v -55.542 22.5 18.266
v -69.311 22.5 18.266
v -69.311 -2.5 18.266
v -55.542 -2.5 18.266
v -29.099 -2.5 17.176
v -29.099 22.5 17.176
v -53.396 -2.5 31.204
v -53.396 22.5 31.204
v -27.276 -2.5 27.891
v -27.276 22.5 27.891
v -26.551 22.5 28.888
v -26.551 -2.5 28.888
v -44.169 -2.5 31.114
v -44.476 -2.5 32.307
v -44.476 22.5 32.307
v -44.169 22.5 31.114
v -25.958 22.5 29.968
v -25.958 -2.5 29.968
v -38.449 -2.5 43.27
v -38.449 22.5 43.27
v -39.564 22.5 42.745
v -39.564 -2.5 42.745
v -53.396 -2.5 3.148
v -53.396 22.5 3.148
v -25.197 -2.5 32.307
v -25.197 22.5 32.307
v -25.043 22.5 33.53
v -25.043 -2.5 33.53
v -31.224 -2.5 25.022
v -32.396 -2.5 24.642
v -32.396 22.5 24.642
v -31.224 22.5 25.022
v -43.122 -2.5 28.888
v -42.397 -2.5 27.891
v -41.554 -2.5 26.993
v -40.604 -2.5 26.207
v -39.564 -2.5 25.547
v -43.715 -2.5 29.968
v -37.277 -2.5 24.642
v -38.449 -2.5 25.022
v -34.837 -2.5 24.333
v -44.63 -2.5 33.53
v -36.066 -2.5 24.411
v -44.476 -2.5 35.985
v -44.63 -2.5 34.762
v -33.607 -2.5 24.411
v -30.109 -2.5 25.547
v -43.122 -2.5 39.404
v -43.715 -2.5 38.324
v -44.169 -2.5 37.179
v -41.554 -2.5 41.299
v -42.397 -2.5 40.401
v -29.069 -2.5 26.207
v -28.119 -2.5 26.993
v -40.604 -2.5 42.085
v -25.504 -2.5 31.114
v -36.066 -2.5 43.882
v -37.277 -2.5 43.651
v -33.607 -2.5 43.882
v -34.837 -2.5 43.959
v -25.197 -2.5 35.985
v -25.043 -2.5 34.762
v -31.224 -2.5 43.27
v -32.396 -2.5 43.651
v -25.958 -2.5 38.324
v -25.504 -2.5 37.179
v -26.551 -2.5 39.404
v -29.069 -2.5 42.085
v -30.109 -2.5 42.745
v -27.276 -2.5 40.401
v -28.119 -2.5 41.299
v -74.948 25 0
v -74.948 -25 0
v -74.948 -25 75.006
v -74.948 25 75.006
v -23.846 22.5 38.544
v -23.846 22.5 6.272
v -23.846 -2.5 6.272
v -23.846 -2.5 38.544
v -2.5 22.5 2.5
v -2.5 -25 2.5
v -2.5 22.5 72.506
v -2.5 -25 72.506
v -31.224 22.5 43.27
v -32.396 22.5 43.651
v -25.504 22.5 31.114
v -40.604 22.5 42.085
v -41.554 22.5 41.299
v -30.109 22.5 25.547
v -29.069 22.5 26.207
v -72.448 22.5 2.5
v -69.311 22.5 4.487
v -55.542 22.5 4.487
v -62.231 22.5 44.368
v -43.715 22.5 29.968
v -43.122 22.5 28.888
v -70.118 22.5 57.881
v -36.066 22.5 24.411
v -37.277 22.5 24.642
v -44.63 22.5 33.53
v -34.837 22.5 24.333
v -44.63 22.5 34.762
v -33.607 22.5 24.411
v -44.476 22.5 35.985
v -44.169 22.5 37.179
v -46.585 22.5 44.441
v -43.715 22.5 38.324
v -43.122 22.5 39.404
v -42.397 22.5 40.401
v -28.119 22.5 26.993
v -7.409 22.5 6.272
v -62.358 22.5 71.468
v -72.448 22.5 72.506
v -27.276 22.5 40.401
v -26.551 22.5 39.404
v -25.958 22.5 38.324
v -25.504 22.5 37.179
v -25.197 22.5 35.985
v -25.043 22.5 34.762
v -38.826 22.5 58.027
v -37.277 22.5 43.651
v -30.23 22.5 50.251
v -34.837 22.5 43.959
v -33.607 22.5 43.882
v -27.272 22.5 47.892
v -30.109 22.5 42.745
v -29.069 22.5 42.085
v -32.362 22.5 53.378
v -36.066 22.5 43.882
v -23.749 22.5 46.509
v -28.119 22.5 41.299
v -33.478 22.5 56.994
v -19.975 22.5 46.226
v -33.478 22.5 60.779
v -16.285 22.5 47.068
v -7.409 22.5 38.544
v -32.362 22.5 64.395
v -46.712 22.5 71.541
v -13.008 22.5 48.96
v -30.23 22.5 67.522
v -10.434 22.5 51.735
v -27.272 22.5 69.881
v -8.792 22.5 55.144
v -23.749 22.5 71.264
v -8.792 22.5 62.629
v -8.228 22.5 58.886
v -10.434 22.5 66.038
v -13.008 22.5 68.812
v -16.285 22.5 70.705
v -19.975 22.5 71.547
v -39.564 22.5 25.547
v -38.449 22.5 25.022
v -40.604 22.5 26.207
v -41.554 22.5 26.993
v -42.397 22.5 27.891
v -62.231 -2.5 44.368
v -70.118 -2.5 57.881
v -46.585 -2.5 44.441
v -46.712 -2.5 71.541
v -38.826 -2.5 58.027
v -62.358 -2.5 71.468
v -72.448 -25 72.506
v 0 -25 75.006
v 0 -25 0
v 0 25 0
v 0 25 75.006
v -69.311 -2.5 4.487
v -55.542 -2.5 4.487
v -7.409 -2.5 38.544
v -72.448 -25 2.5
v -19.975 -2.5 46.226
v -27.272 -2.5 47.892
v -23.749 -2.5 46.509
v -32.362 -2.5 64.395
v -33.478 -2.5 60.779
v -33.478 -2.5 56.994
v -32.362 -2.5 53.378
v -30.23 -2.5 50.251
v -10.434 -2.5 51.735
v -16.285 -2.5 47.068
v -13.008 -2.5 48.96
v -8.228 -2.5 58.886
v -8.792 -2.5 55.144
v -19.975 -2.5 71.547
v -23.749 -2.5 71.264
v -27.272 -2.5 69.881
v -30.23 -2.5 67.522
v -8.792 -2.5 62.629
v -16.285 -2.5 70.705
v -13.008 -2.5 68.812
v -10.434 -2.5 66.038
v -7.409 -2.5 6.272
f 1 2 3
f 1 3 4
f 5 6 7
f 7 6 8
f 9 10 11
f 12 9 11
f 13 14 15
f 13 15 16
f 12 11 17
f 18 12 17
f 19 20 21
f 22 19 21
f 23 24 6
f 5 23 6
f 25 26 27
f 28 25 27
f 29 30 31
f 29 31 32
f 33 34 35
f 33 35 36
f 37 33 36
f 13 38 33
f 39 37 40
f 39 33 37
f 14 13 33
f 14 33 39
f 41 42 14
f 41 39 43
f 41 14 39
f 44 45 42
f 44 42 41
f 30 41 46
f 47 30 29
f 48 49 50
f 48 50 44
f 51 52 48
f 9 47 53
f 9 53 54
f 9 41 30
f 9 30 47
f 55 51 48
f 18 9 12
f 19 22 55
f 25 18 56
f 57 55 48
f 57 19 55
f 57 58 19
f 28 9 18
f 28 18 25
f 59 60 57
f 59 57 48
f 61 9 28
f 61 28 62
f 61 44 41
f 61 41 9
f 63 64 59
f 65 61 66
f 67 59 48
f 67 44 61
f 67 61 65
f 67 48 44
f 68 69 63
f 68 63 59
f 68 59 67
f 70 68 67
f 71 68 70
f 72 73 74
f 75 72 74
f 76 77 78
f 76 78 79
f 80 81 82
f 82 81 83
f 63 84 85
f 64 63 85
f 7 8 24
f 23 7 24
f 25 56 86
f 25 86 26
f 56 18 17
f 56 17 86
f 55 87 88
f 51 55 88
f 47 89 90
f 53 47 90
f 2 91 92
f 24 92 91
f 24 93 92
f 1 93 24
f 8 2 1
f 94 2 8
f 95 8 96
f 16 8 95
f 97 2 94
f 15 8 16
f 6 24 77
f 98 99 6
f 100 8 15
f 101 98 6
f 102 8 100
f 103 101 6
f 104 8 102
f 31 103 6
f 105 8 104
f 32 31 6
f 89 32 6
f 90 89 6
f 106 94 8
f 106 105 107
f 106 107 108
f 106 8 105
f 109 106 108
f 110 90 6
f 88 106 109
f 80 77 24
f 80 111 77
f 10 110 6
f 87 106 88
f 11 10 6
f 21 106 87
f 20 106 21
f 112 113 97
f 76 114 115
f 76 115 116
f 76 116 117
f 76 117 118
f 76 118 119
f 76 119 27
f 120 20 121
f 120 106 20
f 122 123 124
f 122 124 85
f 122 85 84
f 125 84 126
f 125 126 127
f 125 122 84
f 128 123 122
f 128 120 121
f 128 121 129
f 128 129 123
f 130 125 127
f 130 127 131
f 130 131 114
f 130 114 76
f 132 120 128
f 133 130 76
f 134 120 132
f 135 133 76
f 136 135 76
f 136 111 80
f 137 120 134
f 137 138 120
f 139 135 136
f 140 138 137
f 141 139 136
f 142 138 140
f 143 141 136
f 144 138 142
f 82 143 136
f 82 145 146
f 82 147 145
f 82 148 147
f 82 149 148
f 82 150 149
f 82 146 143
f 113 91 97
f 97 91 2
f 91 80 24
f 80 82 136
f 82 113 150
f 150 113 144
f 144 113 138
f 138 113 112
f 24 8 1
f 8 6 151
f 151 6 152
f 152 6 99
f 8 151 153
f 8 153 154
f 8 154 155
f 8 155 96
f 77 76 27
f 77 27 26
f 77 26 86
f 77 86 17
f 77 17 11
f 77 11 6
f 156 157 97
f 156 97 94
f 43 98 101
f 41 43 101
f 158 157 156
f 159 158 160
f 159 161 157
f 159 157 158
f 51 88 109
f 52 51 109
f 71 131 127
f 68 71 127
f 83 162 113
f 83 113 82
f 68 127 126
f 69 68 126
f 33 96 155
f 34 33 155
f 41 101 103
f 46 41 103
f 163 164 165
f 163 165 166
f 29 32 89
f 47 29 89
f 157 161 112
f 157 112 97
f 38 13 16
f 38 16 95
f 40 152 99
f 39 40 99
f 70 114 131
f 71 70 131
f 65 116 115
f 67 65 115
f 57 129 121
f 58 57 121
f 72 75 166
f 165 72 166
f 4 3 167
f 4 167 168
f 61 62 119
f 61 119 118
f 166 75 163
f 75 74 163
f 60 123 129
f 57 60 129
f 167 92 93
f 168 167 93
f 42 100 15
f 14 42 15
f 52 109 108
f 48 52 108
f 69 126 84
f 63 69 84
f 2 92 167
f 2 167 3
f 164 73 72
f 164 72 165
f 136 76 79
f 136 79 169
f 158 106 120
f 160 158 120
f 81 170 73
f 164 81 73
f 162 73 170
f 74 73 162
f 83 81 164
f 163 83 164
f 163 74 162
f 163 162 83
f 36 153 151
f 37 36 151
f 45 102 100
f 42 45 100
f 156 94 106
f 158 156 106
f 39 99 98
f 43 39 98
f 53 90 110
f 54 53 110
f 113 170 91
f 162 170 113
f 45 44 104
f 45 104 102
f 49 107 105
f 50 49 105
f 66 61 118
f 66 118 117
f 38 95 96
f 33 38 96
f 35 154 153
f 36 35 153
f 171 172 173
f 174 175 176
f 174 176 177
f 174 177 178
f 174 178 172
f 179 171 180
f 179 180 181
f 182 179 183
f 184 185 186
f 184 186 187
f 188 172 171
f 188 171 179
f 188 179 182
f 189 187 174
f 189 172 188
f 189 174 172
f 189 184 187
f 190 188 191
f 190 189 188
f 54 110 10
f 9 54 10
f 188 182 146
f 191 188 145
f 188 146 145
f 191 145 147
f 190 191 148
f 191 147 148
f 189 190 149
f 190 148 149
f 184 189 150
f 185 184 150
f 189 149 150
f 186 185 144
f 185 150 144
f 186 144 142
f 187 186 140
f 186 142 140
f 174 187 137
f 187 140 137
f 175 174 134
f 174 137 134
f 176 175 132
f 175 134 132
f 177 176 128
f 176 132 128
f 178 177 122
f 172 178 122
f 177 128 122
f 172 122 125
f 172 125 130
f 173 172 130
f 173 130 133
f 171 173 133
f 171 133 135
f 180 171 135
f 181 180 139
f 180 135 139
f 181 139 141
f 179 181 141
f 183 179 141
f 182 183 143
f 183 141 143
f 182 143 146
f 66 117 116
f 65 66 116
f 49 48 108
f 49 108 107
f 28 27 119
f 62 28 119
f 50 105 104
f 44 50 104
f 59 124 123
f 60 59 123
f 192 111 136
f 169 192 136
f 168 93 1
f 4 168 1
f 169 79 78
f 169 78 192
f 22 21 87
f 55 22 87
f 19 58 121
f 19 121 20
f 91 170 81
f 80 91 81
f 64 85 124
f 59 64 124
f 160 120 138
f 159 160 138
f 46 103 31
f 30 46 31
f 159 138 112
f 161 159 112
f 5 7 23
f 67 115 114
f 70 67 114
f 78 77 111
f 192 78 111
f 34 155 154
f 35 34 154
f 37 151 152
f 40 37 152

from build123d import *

# Parameters (mm, degrees)
F0_W      = 74.9482437968
F0_H      = 75.0057548285
F1_DEPTH  = 25
F2_DEPTH  = 25
F3_T      = -2.5
F5_DEPTH  = 25
F6_R      = 12.6957463679
F7_DEPTH  = 25
F8_W      = 16.4368115366
F8_H      = 32.2714154609
F9_DEPTH  = 25
F11_DEPTH = 25
F12_W     = 13.7684866786
F12_H     = 13.7785351835
F13_DEPTH = 25
F15_DEPTH = 25


with BuildPart() as f1:
    # F0 (on Front) → F1 (new body)
    with BuildSketch(Plane.XZ):
        with Locations((-37.4741218984, 37.5028774142)):
            Rectangle(F0_W, F0_H)
    extrude(amount=F1_DEPTH)

    # F2 (add): a face of the model
    f2_faces = [f1.faces().sort_by_distance(p)[0] for p in [
        (-37.4741218984, 0, 37.5028774142),
    ]]
    extrude(f2_faces, amount=F2_DEPTH)

    # F3
    f3_openings = [f1.faces().sort_by_distance(p)[0] for p in [
        (-37.474122, -25, 37.502877),
    ]]
    offset(amount=F3_T, openings=f3_openings)

    # F4 (on face) → F5 (join)
    with BuildSketch(Plane.XZ.offset(-22.5)):
        Polygon((-46.5854653187, 44.4409851923), (-38.8256809644, 58.027296792), (-46.7118797764, 71.5406229706), (-62.3578629427, 71.4676375494), (-70.1176472969, 57.8813259497), (-62.231448485, 44.3679997711), align=None)
    extrude(amount=F5_DEPTH)

    # F6 (on face) → F7 (join)
    with BuildSketch(Plane.XZ.offset(-22.5)):
        with Locations((-20.9236498922, 58.88639763)):
            Circle(F6_R)
    extrude(amount=F7_DEPTH)

    # F8 (on face) → F9 (join)
    with BuildSketch(Plane.XZ.offset(-22.5)):
        with Locations((-15.6277697533, 22.4080828484)):
            Rectangle(F8_W, F8_H)
    extrude(amount=F9_DEPTH)

    # F10 (on face) → F11 (join)
    with BuildSketch(Plane.XZ.offset(-22.5)):
        Polygon((-53.3962547779, 31.2044414208), (-53.3962547779, 3.1478276029), (-29.0985144675, 17.1761345118), align=None)
    extrude(amount=F11_DEPTH)

    # F12 (on face) → F13 (join)
    with BuildSketch(Plane.XZ.offset(-22.5)):
        with Locations((-62.4265633523, 11.3765813876)):
            Rectangle(F12_W, F12_H)
    extrude(amount=F13_DEPTH)

    # F14 (on face) → F15 (join)
    with BuildSketch(Plane.XZ.offset(-22.5)):
        Polygon((-44.6300245821, 34.7623496997), (-44.6300245821, 33.5300371302), (-44.475574863, 32.3074417133), (-44.1691111892, 31.1138445092), (-43.7154666758, 29.9680692588), (-43.1217955677, 28.8881855222), (-42.3974604132, 27.8912237111), (-41.5538844101, 26.9929065087), (-40.604371256, 26.207400914), (-39.5638953406, 25.5470948195), (-38.4488655906, 25.0224016466), (-37.2768666912, 24.6415961203), (-36.0663817653, 24.410683771), (-34.8365008831, 24.3333062246), (-33.6066200009, 24.410683771), (-32.396135075, 24.6415961203), (-31.2241361756, 25.0224016466), (-30.1091064256, 25.5470948195), (-29.0686305102, 26.207400914), (-28.1191173561, 26.9929065087), (-27.2755413531, 27.8912237111), (-26.5512061985, 28.8881855222), (-25.9575350905, 29.9680692588), (-25.503890577, 31.1138445092), (-25.1974269032, 32.3074417133), (-25.0429771841, 33.5300371302), (-25.0429771841, 34.7623496997), (-25.1974269032, 35.9849451165), (-25.503890577, 37.1785423206), (-25.9575350905, 38.3243175711), (-26.5512061985, 39.4042013076), (-27.2755413531, 40.4011631188), (-28.1191173561, 41.2994803211), (-29.0686305102, 42.0849859158), (-30.1091064256, 42.7452920104), (-31.2241361756, 43.2699851832), (-32.396135075, 43.6507907096), (-33.6066200009, 43.8817030588), (-34.8365008831, 43.9590806053), (-36.0663817653, 43.8817030588), (-37.2768666912, 43.6507907096), (-38.4488655906, 43.2699851832), (-39.5638953406, 42.7452920104), (-40.604371256, 42.0849859158), (-41.5538844101, 41.2994803211), (-42.3974604132, 40.4011631188), (-43.1217955677, 39.4042013076), (-43.7154666758, 38.3243175711), (-44.1691111892, 37.1785423206), (-44.475574863, 35.9849451165), align=None)
    extrude(amount=F15_DEPTH)


solid = f1.part
